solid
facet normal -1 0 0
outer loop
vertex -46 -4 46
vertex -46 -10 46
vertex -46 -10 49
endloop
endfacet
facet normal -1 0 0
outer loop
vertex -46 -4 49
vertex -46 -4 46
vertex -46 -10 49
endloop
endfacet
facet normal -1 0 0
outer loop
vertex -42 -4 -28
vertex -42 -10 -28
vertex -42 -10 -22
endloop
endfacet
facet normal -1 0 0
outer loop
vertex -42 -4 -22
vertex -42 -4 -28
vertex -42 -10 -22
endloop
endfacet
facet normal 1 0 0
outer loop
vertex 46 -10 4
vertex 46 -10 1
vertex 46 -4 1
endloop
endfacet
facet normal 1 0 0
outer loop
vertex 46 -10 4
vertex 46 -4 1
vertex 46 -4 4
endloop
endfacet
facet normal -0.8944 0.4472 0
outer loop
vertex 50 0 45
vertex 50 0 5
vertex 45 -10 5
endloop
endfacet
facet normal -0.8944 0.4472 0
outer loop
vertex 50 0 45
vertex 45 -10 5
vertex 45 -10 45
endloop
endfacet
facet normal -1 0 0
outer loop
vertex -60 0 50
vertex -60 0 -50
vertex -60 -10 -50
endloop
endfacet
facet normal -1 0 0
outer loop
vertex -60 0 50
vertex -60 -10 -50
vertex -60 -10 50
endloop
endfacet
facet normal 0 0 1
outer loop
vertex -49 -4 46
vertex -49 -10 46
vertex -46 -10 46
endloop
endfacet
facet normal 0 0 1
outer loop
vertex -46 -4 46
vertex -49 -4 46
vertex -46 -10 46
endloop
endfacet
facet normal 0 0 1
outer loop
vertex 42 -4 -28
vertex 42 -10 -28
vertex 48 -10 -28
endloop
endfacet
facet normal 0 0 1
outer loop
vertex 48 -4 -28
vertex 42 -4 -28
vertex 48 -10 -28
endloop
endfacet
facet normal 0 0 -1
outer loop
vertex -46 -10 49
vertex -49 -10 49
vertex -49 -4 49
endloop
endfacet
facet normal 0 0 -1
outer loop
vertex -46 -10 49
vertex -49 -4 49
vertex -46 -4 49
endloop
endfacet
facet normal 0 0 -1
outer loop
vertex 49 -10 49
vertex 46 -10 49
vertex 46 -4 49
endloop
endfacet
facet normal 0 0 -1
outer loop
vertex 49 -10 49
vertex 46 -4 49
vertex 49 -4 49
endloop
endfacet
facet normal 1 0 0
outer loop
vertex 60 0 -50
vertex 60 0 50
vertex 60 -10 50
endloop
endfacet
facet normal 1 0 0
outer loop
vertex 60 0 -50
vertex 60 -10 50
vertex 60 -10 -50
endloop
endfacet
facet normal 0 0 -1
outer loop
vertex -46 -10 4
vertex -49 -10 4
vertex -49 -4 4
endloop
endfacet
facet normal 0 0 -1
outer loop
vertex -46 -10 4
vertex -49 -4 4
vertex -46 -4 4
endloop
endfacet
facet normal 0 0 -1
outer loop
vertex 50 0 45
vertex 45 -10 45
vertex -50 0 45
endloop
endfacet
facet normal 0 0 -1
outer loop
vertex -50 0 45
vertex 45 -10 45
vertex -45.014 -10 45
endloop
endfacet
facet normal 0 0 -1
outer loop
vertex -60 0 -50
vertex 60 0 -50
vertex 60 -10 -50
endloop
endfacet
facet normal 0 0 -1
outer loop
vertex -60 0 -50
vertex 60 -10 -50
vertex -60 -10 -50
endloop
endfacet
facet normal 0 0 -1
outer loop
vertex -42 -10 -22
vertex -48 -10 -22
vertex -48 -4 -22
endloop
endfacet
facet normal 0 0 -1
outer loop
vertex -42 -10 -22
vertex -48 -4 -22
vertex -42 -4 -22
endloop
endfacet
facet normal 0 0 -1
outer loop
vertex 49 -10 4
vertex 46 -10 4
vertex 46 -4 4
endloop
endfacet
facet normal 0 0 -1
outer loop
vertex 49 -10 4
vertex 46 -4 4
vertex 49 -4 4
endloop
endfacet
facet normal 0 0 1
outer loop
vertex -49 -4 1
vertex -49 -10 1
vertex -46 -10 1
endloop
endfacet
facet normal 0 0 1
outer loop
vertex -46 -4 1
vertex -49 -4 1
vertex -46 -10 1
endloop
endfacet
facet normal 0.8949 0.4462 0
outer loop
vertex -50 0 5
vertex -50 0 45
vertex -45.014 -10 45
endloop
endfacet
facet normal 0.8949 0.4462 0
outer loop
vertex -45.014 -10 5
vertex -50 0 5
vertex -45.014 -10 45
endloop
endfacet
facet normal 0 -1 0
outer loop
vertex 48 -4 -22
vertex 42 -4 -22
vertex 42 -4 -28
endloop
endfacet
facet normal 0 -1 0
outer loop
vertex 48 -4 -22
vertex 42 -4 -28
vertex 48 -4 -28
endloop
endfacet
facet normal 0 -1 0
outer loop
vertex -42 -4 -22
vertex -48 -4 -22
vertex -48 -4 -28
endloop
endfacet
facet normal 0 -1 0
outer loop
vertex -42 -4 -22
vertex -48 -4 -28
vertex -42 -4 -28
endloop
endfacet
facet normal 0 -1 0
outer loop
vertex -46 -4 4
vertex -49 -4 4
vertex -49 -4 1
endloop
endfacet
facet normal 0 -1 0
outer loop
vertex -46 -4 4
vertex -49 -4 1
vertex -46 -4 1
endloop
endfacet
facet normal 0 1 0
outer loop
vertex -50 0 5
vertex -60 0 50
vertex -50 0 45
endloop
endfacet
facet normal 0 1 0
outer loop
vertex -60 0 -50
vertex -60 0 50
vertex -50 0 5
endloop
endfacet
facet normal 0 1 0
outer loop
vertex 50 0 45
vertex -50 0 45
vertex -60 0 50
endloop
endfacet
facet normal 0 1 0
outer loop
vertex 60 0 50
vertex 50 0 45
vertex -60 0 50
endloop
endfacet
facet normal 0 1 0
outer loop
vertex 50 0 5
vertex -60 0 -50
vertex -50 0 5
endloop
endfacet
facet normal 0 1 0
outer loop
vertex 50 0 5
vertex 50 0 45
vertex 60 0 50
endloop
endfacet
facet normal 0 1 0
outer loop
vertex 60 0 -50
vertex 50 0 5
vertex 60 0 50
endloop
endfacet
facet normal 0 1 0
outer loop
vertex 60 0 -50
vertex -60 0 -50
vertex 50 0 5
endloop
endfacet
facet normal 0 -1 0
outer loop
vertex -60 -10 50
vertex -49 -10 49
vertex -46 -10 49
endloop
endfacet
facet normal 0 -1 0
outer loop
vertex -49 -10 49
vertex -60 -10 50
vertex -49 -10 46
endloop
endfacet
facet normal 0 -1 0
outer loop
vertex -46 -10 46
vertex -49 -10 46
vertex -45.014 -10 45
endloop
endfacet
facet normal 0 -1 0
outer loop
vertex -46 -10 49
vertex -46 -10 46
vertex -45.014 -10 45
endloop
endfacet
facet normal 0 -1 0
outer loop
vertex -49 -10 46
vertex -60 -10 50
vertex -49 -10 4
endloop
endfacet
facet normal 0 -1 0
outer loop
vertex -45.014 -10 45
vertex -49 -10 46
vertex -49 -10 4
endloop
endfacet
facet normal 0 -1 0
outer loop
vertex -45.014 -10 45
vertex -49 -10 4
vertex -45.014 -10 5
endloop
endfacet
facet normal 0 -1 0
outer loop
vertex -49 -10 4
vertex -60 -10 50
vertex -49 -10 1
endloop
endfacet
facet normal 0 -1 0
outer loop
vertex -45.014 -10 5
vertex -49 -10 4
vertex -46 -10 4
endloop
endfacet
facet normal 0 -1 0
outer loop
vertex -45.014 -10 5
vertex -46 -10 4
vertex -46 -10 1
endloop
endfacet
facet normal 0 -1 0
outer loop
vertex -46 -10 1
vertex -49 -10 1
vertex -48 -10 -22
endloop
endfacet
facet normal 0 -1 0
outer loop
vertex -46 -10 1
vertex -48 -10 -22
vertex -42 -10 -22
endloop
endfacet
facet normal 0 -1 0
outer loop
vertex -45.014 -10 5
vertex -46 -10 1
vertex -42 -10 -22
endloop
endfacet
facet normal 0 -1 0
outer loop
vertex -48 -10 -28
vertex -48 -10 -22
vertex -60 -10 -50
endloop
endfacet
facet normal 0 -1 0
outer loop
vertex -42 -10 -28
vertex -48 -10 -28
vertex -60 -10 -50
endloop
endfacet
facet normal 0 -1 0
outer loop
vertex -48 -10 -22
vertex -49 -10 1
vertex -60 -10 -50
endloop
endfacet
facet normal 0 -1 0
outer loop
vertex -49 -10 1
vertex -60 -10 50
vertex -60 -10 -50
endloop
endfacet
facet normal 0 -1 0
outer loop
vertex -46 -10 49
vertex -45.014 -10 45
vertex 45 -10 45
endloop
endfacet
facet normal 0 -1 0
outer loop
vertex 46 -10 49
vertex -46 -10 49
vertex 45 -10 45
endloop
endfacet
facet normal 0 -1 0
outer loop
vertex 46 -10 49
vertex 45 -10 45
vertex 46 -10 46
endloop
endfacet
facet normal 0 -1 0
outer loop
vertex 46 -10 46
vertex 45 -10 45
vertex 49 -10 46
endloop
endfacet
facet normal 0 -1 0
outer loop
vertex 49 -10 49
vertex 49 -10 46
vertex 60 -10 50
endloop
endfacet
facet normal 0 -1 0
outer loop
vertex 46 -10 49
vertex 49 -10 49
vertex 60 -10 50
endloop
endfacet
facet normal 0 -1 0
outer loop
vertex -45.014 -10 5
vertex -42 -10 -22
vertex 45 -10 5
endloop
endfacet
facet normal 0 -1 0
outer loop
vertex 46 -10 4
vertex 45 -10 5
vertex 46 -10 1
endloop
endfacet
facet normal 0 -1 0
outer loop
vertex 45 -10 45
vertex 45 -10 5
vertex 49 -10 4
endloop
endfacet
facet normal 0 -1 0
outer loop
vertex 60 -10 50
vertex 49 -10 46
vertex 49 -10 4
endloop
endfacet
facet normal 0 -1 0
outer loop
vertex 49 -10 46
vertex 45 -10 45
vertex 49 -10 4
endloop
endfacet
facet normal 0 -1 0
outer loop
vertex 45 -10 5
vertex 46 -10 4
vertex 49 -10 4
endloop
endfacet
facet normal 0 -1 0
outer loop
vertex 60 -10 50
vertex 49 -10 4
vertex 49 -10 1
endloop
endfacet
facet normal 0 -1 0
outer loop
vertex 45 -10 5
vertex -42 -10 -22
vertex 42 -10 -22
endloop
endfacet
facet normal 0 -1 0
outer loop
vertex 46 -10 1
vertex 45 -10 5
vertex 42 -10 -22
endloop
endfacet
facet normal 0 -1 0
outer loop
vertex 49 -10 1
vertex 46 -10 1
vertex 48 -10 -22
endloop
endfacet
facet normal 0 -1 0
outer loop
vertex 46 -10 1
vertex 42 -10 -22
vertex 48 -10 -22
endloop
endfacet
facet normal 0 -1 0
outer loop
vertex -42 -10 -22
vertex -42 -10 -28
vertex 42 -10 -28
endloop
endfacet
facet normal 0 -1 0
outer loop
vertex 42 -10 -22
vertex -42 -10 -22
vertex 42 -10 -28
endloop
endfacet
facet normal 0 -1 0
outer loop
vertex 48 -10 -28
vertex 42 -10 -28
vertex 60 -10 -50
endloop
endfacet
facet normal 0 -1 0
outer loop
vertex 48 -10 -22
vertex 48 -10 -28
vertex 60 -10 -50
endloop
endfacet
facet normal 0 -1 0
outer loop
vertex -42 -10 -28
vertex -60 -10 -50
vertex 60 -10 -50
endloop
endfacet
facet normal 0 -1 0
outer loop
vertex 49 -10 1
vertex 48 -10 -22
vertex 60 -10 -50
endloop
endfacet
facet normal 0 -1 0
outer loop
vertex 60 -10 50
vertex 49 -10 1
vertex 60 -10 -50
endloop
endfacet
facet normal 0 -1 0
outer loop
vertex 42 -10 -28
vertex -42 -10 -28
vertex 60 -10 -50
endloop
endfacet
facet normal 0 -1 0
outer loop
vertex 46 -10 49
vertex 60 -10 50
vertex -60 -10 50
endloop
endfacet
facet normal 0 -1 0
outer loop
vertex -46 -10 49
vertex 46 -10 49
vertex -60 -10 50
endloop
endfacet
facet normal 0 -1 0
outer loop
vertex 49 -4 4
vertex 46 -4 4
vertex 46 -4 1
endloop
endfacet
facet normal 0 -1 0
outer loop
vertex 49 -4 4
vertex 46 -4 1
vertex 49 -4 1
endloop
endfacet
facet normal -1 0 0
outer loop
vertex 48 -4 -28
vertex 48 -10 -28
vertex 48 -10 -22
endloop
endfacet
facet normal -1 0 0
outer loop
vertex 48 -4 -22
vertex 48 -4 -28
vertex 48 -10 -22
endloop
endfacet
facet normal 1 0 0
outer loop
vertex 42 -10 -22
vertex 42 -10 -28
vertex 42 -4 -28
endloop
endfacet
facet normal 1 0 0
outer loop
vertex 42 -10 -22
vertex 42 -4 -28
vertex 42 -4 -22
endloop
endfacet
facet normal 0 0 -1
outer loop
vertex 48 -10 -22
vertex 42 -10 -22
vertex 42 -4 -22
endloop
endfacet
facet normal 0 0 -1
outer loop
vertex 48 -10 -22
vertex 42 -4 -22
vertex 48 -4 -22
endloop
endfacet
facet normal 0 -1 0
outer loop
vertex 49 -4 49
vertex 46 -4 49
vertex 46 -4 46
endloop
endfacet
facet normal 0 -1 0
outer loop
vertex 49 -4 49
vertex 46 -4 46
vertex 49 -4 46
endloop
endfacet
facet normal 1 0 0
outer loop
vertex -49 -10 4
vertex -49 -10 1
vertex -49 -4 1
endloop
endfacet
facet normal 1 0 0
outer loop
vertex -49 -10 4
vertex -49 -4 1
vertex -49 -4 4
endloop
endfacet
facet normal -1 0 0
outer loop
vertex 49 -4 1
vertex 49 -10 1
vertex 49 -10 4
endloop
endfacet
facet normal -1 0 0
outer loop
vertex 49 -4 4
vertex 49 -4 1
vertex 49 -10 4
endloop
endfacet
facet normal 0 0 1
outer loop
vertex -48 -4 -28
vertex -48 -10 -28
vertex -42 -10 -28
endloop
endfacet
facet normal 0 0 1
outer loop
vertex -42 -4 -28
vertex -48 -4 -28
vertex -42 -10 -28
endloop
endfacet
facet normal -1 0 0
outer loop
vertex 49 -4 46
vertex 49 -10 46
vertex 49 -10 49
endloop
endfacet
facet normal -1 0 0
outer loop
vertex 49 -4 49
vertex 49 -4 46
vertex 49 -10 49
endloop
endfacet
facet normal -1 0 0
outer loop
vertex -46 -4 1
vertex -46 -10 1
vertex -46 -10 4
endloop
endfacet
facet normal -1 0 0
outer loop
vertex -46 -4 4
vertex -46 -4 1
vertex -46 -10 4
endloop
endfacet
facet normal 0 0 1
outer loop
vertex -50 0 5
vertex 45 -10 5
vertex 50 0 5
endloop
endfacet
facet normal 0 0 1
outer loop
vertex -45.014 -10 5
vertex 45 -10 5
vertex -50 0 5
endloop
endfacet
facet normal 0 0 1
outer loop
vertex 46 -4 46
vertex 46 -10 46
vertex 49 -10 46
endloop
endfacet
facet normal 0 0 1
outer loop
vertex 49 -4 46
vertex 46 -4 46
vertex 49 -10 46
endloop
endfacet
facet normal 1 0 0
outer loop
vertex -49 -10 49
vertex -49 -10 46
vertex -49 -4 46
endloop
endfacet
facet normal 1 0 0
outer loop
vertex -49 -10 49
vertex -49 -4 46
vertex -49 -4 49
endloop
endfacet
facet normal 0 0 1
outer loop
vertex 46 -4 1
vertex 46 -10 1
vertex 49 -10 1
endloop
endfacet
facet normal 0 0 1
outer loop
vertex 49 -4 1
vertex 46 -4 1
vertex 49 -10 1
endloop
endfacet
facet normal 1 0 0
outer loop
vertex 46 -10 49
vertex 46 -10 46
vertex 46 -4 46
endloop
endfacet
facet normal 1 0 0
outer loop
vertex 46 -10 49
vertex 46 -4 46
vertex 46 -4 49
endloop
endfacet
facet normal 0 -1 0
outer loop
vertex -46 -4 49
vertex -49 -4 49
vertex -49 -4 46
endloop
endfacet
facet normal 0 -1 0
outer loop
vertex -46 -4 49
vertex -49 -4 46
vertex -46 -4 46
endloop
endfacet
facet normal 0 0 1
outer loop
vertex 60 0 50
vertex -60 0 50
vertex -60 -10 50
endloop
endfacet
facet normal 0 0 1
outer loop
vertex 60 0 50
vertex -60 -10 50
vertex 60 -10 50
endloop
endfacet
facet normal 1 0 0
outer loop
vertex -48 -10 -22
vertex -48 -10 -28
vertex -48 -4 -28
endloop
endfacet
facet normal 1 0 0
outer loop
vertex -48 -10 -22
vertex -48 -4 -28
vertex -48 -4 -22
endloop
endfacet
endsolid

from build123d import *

# Parameters (mm, degrees)
BOSS_EXTRUDE1_DEPTH = 10
SKETCH2_W           = 90
SKETCH2_H           = 40
CUT_EXTRUDE1_DEPTH  = 10
SKETCH2_3_W         = 3
SKETCH2_3_H         = 3
SKETCH2_3_W_2       = 6
SKETCH2_3_H_2       = 6
CUT_EXTRUDE2_DEPTH  = 6
CHAMFER2_SIZE       = 5
CHAMFER2_SIZE_2     = 10.028448541
CHAMFER3_SIZE2      = 4.999988835
CHAMFER3_SIZE       = 10


# Some blends are built 0.0001 mm under size
with BuildPart() as part:
    # Sketch1 → Boss-Extrude1 (new body)
    with BuildSketch(Plane(origin=(0, 0, 0), x_dir=(1, 0, 0), z_dir=(0, 1, 0))):
        Polygon((-60, 50), (-60, -2.5), (-60, -50), (0, -50), (60, -50), (60, 50), (0, 50), align=None)
    extrude(amount=-BOSS_EXTRUDE1_DEPTH)

    # Sketch2 → Cut-Extrude1 (cut)
    with BuildSketch(Plane.XZ.offset(10)):
        with Locations((0, 25)):
            Rectangle(SKETCH2_W, SKETCH2_H)
    extrude(amount=-CUT_EXTRUDE1_DEPTH, mode=Mode.SUBTRACT)

    # Sketch2<3> → Cut-Extrude2 (cut)
    with BuildSketch(Plane.XZ.offset(10)):
        with Locations((47.5, 47.5)):
            Rectangle(SKETCH2_3_W, SKETCH2_3_H)
        with Locations((-47.5, 2.5)):
            Rectangle(SKETCH2_3_W, SKETCH2_3_H)
        with Locations((47.5, 2.5)):
            Rectangle(SKETCH2_3_W, SKETCH2_3_H)
        with Locations((45, -25)):
            Rectangle(SKETCH2_3_W_2, SKETCH2_3_H_2)
        with Locations((-47.5, 47.5)):
            Rectangle(SKETCH2_3_W, SKETCH2_3_H)
        with Locations((-45, -25)):
            Rectangle(SKETCH2_3_W_2, SKETCH2_3_H_2)
    extrude(amount=-CUT_EXTRUDE2_DEPTH, mode=Mode.SUBTRACT)

    # Chamfer2
    # the kernel refuses this chamfer: 10.028448541, 5 mm, written as the material it takes off along each edge
    with BuildSketch(Plane(origin=(-45, 0, 5), x_dir=(-0.9976061957759285, 0.06915112543899754, 0), z_dir=(0, 0, 1))) as chamfer2_piece_1:
        Polygon((CHAMFER2_SIZE * 0.997606195776, CHAMFER2_SIZE * 0.069151125439), (-CHAMFER2_SIZE_2 * 0.069151125441, CHAMFER2_SIZE_2 * 0.997606195805), (0, 0), align=None)
    extrude(amount=40, mode=Mode.SUBTRACT)

    # Chamfer3
    chamfer3_edges = [part.edges().sort_by_distance(p)[0] for p in [
        (45, 0, 25),
    ]]
    chamfer3_side = [part.faces().sort_by_distance(p)[0] for p in [
        (45, -0.099999777, 25),
    ]]
    chamfer(chamfer3_edges, length=CHAMFER3_SIZE - 0.0001, length2=CHAMFER3_SIZE2 - 0.0001, reference=chamfer3_side[0])  # a hair under: the kernel refuses the full size


solid = part.part
